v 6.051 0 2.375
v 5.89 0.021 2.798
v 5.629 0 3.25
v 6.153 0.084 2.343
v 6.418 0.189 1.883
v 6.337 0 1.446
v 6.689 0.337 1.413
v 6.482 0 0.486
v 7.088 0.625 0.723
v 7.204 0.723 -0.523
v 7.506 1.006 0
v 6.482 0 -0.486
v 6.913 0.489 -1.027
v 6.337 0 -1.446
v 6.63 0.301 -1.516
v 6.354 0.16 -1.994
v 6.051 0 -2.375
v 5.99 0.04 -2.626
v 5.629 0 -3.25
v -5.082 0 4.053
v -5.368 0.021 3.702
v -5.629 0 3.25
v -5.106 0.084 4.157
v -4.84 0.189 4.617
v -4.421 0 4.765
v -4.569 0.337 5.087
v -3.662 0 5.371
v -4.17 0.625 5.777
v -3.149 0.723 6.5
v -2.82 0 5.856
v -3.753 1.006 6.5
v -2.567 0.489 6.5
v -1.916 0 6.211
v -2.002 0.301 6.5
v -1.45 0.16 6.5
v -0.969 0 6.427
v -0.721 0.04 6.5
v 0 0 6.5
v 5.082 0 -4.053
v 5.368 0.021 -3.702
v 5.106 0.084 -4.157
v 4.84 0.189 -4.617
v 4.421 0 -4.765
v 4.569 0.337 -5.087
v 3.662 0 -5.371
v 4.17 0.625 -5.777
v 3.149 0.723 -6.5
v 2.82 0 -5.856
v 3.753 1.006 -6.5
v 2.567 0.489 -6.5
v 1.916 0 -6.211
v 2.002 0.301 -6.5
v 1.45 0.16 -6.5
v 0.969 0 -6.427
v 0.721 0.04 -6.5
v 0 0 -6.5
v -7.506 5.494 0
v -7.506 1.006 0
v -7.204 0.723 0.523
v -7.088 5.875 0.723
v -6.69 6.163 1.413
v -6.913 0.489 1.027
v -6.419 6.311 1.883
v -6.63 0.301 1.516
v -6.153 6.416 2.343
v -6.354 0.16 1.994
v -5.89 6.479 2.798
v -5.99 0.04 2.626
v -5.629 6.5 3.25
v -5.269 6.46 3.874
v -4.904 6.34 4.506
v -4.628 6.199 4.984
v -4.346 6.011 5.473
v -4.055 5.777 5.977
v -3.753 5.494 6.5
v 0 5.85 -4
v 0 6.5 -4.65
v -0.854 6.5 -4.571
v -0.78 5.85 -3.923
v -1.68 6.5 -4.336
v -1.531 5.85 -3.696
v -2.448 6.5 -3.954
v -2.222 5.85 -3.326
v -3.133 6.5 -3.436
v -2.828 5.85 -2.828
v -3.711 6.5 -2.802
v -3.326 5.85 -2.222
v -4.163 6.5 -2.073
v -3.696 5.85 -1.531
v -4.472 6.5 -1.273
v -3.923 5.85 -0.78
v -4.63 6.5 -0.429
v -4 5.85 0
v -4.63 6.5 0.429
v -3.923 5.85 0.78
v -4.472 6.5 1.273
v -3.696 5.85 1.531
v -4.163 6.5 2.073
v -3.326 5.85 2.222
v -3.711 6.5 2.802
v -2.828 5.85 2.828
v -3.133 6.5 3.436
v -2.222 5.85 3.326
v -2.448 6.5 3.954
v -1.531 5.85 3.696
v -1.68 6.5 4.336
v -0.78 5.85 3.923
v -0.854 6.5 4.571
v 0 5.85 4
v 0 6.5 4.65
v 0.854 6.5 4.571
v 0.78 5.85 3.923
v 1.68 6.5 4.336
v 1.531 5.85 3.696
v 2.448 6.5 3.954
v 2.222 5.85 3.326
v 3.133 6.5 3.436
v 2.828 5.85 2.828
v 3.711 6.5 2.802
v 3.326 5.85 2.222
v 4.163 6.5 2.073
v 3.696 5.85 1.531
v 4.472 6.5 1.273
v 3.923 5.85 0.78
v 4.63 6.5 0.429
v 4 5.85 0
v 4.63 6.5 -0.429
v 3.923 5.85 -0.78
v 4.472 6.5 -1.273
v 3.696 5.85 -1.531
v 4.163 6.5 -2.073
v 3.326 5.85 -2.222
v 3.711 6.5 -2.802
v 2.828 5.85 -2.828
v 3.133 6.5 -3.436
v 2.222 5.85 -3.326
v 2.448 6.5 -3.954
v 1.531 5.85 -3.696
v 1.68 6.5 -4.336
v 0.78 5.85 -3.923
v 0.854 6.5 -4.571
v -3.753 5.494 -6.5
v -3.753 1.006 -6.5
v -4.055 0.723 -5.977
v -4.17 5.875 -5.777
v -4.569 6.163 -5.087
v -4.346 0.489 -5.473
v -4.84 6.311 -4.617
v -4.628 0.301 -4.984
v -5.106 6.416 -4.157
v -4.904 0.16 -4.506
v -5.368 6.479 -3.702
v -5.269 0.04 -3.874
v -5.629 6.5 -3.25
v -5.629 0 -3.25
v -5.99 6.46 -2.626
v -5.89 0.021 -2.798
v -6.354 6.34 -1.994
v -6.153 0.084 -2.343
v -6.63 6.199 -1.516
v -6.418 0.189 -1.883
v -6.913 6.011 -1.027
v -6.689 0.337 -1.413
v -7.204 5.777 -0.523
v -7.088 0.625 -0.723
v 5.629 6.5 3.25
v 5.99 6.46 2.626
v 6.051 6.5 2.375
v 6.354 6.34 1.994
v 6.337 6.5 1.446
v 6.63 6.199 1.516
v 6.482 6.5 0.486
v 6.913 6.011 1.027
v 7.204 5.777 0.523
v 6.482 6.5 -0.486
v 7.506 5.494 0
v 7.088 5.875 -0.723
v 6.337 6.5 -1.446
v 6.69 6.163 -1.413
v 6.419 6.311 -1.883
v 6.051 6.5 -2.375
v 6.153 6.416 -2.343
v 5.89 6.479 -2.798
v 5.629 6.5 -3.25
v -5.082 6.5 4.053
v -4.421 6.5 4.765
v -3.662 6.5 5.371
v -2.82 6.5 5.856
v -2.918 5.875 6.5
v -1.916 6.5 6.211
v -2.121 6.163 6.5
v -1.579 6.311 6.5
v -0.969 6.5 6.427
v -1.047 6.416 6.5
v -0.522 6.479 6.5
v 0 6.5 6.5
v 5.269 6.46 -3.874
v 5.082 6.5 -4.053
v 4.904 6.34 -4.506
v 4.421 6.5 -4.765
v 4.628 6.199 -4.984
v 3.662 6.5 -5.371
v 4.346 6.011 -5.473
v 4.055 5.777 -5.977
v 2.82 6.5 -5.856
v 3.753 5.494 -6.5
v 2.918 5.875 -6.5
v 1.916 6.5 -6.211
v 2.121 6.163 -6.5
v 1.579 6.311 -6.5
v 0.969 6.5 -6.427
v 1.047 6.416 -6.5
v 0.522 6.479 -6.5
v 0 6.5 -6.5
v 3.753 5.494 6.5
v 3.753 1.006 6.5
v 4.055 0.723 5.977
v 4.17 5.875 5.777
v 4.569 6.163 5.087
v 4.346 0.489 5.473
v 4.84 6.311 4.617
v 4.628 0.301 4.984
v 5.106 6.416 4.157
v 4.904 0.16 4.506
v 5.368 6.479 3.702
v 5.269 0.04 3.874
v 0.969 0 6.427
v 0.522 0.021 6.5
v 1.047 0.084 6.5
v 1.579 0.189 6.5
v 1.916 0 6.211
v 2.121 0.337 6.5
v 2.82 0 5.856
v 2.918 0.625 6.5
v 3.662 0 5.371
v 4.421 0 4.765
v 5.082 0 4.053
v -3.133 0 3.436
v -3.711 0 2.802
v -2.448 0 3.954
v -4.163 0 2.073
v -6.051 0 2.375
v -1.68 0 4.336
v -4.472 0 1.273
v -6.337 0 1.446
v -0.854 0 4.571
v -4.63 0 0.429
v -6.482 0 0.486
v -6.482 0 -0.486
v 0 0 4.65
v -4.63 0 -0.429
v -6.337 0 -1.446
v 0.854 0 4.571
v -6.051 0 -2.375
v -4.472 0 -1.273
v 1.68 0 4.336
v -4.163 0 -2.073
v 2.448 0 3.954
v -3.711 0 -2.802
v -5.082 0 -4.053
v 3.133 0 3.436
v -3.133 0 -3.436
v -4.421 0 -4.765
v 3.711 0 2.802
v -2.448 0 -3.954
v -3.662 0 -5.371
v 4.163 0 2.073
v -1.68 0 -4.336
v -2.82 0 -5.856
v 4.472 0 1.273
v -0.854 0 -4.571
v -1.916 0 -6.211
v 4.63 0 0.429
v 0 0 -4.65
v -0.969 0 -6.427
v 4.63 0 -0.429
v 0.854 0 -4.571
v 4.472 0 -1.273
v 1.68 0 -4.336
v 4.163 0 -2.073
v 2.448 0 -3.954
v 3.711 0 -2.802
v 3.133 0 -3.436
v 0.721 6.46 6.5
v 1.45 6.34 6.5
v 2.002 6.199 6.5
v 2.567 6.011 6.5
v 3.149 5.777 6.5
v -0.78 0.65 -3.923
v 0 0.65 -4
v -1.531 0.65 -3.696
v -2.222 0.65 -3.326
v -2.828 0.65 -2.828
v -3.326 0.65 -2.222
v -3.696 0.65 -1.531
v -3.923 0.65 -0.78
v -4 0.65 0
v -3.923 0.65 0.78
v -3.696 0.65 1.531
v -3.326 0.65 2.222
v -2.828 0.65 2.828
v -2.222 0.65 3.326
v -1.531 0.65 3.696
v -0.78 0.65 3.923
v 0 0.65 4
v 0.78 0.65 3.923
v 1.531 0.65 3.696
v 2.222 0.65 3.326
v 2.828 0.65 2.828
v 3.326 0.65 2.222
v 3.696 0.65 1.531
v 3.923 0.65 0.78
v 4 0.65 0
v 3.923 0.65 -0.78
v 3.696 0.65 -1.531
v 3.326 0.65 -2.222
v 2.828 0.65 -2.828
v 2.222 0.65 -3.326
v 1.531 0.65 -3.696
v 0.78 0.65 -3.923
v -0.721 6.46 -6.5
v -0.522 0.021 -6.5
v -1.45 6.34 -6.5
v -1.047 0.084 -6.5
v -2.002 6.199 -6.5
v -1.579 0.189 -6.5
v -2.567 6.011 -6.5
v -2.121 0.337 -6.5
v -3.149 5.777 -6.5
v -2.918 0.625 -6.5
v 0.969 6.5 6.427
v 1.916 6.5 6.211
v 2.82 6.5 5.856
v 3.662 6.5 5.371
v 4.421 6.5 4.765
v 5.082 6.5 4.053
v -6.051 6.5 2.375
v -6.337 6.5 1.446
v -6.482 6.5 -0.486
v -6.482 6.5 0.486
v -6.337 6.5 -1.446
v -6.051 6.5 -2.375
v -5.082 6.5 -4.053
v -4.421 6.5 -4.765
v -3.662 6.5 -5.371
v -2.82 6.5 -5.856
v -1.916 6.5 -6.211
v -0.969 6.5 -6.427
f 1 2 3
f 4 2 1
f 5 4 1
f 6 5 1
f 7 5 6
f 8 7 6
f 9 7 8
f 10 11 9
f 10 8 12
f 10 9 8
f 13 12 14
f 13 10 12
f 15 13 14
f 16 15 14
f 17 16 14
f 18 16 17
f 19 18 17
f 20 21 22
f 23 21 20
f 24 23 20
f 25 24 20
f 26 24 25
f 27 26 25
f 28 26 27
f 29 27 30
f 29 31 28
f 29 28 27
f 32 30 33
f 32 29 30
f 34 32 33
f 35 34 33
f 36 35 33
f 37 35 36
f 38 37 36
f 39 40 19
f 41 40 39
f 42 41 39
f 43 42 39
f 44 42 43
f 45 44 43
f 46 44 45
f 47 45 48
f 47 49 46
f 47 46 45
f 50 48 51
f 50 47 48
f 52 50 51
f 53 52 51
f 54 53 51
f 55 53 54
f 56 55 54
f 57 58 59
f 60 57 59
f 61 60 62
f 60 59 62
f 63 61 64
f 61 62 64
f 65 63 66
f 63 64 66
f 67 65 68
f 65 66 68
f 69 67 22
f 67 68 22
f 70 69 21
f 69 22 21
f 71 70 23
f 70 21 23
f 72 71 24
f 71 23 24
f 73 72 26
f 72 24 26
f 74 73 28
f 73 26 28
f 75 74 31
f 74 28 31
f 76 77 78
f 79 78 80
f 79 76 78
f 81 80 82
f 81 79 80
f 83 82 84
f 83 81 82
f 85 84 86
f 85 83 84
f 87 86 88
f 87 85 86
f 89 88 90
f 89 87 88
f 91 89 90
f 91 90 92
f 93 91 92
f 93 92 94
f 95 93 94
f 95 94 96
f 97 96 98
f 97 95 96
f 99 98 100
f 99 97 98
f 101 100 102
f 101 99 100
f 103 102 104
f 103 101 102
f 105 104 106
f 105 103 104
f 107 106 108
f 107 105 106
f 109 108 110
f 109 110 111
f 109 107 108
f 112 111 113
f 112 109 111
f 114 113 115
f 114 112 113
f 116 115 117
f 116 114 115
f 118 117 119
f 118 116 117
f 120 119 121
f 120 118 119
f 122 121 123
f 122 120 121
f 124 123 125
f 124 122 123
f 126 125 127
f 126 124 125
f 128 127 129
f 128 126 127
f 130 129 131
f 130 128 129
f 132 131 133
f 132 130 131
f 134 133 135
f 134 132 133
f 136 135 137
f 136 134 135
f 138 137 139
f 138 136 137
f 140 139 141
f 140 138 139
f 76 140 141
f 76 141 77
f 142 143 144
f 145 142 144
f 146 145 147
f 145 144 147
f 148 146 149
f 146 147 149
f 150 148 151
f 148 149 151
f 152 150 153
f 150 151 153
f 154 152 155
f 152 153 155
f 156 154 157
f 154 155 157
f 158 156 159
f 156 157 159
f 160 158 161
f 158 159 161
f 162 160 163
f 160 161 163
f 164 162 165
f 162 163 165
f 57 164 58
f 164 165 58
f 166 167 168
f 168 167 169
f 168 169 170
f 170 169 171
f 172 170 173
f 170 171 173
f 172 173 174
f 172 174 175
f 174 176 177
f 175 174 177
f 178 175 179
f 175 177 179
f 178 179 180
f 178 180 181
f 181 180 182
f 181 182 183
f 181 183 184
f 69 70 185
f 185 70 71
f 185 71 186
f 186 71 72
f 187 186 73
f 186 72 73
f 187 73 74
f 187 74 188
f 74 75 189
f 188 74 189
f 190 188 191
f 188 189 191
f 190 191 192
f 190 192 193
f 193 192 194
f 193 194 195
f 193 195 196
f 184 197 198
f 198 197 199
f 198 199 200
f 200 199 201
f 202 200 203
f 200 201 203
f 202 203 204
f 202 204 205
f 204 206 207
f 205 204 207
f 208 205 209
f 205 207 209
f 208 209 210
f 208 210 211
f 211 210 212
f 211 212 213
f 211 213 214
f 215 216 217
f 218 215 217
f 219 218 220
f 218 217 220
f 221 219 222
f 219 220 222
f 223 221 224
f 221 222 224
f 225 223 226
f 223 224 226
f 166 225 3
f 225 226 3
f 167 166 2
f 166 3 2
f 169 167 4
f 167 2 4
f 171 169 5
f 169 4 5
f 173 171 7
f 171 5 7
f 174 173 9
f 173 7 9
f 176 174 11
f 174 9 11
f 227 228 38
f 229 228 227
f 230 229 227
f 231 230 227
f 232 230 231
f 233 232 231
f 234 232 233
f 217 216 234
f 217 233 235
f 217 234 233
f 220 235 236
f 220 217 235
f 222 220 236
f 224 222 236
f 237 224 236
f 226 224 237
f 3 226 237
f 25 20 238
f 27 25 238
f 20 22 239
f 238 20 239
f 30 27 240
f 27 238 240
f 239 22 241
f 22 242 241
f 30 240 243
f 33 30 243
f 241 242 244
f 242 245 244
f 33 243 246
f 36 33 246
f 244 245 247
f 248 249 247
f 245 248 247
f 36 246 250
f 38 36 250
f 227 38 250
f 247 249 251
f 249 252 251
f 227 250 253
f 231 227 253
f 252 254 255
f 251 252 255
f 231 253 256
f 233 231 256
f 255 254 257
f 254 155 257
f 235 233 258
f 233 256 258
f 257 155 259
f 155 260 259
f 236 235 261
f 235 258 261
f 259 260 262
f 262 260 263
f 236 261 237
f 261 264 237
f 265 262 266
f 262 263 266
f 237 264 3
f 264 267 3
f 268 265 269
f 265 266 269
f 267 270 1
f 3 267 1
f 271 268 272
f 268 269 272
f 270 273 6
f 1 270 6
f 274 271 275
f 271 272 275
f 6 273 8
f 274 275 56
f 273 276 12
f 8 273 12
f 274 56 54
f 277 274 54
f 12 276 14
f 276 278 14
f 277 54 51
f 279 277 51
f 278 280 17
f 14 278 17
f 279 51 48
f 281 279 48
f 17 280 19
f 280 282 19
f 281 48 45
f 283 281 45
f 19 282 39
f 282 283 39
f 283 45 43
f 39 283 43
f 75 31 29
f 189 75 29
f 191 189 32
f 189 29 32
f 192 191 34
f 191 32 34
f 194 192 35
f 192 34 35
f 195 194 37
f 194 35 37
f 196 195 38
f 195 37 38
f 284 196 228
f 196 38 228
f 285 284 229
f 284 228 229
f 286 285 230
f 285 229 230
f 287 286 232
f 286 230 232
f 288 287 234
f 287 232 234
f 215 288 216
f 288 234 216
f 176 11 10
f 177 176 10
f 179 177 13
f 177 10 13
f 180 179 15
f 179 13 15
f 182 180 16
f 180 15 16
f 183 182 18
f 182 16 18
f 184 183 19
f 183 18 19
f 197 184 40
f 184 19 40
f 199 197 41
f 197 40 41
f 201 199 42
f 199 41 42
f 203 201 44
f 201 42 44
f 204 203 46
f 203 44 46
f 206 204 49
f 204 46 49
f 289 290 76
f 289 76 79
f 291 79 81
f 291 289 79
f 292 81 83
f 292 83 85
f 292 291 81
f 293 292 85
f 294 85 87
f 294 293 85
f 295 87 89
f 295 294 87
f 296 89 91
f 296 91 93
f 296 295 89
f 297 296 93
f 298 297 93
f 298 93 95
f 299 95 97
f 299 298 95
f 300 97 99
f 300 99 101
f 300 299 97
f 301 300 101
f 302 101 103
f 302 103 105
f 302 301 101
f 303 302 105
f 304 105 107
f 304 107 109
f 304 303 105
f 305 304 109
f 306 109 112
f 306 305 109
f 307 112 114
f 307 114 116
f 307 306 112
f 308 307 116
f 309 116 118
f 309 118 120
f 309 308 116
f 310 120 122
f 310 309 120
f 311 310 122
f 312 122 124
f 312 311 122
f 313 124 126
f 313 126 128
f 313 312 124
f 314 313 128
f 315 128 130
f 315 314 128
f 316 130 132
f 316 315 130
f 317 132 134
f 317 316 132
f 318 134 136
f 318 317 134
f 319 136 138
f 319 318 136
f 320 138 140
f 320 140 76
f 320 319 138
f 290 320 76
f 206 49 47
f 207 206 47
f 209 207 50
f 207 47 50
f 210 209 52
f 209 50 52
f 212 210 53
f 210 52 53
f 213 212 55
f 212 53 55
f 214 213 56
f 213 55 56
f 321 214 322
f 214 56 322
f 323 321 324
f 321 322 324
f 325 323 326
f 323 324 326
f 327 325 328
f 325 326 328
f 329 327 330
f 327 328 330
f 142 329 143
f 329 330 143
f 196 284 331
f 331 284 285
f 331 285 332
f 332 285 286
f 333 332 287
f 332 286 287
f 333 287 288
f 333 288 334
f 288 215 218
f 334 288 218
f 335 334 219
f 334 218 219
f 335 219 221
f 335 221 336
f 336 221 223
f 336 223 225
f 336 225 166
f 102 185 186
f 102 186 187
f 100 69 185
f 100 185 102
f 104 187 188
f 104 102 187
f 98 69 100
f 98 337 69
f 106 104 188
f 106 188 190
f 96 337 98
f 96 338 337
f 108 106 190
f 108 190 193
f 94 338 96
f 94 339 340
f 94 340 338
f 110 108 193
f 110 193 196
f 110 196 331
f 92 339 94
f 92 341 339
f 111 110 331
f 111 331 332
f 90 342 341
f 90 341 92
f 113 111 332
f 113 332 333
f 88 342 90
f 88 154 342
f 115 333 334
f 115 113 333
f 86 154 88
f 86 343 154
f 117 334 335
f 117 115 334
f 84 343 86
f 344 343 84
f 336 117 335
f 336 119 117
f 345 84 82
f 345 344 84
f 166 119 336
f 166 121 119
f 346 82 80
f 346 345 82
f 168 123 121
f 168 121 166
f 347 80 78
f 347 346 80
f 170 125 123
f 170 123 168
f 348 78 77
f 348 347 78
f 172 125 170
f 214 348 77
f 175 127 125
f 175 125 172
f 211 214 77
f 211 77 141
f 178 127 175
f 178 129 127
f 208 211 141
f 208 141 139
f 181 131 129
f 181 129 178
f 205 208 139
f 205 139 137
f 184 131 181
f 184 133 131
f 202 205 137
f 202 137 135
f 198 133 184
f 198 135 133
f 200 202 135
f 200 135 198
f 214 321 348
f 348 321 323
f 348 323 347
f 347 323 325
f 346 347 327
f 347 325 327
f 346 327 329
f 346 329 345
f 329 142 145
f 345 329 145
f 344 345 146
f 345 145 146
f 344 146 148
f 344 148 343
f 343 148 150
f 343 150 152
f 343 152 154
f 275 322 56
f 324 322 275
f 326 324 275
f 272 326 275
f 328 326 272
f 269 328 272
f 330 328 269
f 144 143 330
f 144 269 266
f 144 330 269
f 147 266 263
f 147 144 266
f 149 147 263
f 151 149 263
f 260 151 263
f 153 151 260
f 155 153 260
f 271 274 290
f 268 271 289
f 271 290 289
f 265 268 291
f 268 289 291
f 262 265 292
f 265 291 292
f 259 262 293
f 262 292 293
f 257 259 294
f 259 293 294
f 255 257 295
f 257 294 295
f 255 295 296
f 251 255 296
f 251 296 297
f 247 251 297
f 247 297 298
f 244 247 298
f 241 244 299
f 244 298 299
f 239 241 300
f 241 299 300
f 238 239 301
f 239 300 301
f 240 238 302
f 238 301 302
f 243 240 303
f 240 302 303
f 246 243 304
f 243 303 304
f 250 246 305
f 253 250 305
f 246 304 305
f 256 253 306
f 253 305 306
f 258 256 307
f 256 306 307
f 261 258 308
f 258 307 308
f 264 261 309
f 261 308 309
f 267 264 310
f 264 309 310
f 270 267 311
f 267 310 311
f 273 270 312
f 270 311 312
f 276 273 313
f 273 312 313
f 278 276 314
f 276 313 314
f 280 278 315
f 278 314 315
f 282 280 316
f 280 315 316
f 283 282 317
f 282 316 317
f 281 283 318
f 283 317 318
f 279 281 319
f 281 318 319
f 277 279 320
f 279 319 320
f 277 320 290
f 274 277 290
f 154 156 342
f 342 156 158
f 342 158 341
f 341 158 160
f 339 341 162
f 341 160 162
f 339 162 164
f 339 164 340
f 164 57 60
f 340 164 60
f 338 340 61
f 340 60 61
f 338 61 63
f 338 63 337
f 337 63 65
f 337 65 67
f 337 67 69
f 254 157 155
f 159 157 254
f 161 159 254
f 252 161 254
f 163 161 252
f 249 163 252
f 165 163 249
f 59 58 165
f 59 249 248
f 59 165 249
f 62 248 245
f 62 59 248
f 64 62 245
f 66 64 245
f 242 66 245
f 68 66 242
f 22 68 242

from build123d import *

# Parameters (mm, degrees)
SKETCH1_R           = 4
BOSS_EXTRUDE1_DEPTH = 6.5
CHAMFER1_SIZE       = 0.65


with BuildPart() as part:
    # Sketch1 → Boss-Extrude1 (new body)
    with BuildSketch(Plane(origin=(0, 0, 0), x_dir=(1, 0, 0), z_dir=(0, 1, 0))):
        Polygon((7.505553499, 0), (3.75277675, 6.5), (-3.75277675, 6.5), (-7.505553499, 0), (-3.75277675, -6.5), (3.75277675, -6.5), align=None)
        with Locations(Location((0, 0, 0), (0, 0, 90))):
            Circle(SKETCH1_R, mode=Mode.SUBTRACT)
    extrude(amount=BOSS_EXTRUDE1_DEPTH)

    # Sketch3 → Cut-Revolve1 (revolve, cut)
    with BuildSketch(Plane(origin=(0, 0, 0), x_dir=(0, 0, -1), z_dir=(1, 0, 0))):
        Polygon((-6.5, 0), (-8.75, 2.25), (-8.75, 0), align=None)
        Polygon((-8.75, 6.5), (-6.5, 6.5), (-8.75, 4.25), align=None)
    revolve(axis=Axis((0, 0, 0), (0, 1, 0)), mode=Mode.SUBTRACT)

    # Chamfer1
    chamfer1_edges = [part.edges().sort_by_distance(p)[0] for p in [
        (0, 0, 4),
        (0, 6.5, 4),
    ]]
    chamfer(chamfer1_edges, length=CHAMFER1_SIZE)


solid = part.part
